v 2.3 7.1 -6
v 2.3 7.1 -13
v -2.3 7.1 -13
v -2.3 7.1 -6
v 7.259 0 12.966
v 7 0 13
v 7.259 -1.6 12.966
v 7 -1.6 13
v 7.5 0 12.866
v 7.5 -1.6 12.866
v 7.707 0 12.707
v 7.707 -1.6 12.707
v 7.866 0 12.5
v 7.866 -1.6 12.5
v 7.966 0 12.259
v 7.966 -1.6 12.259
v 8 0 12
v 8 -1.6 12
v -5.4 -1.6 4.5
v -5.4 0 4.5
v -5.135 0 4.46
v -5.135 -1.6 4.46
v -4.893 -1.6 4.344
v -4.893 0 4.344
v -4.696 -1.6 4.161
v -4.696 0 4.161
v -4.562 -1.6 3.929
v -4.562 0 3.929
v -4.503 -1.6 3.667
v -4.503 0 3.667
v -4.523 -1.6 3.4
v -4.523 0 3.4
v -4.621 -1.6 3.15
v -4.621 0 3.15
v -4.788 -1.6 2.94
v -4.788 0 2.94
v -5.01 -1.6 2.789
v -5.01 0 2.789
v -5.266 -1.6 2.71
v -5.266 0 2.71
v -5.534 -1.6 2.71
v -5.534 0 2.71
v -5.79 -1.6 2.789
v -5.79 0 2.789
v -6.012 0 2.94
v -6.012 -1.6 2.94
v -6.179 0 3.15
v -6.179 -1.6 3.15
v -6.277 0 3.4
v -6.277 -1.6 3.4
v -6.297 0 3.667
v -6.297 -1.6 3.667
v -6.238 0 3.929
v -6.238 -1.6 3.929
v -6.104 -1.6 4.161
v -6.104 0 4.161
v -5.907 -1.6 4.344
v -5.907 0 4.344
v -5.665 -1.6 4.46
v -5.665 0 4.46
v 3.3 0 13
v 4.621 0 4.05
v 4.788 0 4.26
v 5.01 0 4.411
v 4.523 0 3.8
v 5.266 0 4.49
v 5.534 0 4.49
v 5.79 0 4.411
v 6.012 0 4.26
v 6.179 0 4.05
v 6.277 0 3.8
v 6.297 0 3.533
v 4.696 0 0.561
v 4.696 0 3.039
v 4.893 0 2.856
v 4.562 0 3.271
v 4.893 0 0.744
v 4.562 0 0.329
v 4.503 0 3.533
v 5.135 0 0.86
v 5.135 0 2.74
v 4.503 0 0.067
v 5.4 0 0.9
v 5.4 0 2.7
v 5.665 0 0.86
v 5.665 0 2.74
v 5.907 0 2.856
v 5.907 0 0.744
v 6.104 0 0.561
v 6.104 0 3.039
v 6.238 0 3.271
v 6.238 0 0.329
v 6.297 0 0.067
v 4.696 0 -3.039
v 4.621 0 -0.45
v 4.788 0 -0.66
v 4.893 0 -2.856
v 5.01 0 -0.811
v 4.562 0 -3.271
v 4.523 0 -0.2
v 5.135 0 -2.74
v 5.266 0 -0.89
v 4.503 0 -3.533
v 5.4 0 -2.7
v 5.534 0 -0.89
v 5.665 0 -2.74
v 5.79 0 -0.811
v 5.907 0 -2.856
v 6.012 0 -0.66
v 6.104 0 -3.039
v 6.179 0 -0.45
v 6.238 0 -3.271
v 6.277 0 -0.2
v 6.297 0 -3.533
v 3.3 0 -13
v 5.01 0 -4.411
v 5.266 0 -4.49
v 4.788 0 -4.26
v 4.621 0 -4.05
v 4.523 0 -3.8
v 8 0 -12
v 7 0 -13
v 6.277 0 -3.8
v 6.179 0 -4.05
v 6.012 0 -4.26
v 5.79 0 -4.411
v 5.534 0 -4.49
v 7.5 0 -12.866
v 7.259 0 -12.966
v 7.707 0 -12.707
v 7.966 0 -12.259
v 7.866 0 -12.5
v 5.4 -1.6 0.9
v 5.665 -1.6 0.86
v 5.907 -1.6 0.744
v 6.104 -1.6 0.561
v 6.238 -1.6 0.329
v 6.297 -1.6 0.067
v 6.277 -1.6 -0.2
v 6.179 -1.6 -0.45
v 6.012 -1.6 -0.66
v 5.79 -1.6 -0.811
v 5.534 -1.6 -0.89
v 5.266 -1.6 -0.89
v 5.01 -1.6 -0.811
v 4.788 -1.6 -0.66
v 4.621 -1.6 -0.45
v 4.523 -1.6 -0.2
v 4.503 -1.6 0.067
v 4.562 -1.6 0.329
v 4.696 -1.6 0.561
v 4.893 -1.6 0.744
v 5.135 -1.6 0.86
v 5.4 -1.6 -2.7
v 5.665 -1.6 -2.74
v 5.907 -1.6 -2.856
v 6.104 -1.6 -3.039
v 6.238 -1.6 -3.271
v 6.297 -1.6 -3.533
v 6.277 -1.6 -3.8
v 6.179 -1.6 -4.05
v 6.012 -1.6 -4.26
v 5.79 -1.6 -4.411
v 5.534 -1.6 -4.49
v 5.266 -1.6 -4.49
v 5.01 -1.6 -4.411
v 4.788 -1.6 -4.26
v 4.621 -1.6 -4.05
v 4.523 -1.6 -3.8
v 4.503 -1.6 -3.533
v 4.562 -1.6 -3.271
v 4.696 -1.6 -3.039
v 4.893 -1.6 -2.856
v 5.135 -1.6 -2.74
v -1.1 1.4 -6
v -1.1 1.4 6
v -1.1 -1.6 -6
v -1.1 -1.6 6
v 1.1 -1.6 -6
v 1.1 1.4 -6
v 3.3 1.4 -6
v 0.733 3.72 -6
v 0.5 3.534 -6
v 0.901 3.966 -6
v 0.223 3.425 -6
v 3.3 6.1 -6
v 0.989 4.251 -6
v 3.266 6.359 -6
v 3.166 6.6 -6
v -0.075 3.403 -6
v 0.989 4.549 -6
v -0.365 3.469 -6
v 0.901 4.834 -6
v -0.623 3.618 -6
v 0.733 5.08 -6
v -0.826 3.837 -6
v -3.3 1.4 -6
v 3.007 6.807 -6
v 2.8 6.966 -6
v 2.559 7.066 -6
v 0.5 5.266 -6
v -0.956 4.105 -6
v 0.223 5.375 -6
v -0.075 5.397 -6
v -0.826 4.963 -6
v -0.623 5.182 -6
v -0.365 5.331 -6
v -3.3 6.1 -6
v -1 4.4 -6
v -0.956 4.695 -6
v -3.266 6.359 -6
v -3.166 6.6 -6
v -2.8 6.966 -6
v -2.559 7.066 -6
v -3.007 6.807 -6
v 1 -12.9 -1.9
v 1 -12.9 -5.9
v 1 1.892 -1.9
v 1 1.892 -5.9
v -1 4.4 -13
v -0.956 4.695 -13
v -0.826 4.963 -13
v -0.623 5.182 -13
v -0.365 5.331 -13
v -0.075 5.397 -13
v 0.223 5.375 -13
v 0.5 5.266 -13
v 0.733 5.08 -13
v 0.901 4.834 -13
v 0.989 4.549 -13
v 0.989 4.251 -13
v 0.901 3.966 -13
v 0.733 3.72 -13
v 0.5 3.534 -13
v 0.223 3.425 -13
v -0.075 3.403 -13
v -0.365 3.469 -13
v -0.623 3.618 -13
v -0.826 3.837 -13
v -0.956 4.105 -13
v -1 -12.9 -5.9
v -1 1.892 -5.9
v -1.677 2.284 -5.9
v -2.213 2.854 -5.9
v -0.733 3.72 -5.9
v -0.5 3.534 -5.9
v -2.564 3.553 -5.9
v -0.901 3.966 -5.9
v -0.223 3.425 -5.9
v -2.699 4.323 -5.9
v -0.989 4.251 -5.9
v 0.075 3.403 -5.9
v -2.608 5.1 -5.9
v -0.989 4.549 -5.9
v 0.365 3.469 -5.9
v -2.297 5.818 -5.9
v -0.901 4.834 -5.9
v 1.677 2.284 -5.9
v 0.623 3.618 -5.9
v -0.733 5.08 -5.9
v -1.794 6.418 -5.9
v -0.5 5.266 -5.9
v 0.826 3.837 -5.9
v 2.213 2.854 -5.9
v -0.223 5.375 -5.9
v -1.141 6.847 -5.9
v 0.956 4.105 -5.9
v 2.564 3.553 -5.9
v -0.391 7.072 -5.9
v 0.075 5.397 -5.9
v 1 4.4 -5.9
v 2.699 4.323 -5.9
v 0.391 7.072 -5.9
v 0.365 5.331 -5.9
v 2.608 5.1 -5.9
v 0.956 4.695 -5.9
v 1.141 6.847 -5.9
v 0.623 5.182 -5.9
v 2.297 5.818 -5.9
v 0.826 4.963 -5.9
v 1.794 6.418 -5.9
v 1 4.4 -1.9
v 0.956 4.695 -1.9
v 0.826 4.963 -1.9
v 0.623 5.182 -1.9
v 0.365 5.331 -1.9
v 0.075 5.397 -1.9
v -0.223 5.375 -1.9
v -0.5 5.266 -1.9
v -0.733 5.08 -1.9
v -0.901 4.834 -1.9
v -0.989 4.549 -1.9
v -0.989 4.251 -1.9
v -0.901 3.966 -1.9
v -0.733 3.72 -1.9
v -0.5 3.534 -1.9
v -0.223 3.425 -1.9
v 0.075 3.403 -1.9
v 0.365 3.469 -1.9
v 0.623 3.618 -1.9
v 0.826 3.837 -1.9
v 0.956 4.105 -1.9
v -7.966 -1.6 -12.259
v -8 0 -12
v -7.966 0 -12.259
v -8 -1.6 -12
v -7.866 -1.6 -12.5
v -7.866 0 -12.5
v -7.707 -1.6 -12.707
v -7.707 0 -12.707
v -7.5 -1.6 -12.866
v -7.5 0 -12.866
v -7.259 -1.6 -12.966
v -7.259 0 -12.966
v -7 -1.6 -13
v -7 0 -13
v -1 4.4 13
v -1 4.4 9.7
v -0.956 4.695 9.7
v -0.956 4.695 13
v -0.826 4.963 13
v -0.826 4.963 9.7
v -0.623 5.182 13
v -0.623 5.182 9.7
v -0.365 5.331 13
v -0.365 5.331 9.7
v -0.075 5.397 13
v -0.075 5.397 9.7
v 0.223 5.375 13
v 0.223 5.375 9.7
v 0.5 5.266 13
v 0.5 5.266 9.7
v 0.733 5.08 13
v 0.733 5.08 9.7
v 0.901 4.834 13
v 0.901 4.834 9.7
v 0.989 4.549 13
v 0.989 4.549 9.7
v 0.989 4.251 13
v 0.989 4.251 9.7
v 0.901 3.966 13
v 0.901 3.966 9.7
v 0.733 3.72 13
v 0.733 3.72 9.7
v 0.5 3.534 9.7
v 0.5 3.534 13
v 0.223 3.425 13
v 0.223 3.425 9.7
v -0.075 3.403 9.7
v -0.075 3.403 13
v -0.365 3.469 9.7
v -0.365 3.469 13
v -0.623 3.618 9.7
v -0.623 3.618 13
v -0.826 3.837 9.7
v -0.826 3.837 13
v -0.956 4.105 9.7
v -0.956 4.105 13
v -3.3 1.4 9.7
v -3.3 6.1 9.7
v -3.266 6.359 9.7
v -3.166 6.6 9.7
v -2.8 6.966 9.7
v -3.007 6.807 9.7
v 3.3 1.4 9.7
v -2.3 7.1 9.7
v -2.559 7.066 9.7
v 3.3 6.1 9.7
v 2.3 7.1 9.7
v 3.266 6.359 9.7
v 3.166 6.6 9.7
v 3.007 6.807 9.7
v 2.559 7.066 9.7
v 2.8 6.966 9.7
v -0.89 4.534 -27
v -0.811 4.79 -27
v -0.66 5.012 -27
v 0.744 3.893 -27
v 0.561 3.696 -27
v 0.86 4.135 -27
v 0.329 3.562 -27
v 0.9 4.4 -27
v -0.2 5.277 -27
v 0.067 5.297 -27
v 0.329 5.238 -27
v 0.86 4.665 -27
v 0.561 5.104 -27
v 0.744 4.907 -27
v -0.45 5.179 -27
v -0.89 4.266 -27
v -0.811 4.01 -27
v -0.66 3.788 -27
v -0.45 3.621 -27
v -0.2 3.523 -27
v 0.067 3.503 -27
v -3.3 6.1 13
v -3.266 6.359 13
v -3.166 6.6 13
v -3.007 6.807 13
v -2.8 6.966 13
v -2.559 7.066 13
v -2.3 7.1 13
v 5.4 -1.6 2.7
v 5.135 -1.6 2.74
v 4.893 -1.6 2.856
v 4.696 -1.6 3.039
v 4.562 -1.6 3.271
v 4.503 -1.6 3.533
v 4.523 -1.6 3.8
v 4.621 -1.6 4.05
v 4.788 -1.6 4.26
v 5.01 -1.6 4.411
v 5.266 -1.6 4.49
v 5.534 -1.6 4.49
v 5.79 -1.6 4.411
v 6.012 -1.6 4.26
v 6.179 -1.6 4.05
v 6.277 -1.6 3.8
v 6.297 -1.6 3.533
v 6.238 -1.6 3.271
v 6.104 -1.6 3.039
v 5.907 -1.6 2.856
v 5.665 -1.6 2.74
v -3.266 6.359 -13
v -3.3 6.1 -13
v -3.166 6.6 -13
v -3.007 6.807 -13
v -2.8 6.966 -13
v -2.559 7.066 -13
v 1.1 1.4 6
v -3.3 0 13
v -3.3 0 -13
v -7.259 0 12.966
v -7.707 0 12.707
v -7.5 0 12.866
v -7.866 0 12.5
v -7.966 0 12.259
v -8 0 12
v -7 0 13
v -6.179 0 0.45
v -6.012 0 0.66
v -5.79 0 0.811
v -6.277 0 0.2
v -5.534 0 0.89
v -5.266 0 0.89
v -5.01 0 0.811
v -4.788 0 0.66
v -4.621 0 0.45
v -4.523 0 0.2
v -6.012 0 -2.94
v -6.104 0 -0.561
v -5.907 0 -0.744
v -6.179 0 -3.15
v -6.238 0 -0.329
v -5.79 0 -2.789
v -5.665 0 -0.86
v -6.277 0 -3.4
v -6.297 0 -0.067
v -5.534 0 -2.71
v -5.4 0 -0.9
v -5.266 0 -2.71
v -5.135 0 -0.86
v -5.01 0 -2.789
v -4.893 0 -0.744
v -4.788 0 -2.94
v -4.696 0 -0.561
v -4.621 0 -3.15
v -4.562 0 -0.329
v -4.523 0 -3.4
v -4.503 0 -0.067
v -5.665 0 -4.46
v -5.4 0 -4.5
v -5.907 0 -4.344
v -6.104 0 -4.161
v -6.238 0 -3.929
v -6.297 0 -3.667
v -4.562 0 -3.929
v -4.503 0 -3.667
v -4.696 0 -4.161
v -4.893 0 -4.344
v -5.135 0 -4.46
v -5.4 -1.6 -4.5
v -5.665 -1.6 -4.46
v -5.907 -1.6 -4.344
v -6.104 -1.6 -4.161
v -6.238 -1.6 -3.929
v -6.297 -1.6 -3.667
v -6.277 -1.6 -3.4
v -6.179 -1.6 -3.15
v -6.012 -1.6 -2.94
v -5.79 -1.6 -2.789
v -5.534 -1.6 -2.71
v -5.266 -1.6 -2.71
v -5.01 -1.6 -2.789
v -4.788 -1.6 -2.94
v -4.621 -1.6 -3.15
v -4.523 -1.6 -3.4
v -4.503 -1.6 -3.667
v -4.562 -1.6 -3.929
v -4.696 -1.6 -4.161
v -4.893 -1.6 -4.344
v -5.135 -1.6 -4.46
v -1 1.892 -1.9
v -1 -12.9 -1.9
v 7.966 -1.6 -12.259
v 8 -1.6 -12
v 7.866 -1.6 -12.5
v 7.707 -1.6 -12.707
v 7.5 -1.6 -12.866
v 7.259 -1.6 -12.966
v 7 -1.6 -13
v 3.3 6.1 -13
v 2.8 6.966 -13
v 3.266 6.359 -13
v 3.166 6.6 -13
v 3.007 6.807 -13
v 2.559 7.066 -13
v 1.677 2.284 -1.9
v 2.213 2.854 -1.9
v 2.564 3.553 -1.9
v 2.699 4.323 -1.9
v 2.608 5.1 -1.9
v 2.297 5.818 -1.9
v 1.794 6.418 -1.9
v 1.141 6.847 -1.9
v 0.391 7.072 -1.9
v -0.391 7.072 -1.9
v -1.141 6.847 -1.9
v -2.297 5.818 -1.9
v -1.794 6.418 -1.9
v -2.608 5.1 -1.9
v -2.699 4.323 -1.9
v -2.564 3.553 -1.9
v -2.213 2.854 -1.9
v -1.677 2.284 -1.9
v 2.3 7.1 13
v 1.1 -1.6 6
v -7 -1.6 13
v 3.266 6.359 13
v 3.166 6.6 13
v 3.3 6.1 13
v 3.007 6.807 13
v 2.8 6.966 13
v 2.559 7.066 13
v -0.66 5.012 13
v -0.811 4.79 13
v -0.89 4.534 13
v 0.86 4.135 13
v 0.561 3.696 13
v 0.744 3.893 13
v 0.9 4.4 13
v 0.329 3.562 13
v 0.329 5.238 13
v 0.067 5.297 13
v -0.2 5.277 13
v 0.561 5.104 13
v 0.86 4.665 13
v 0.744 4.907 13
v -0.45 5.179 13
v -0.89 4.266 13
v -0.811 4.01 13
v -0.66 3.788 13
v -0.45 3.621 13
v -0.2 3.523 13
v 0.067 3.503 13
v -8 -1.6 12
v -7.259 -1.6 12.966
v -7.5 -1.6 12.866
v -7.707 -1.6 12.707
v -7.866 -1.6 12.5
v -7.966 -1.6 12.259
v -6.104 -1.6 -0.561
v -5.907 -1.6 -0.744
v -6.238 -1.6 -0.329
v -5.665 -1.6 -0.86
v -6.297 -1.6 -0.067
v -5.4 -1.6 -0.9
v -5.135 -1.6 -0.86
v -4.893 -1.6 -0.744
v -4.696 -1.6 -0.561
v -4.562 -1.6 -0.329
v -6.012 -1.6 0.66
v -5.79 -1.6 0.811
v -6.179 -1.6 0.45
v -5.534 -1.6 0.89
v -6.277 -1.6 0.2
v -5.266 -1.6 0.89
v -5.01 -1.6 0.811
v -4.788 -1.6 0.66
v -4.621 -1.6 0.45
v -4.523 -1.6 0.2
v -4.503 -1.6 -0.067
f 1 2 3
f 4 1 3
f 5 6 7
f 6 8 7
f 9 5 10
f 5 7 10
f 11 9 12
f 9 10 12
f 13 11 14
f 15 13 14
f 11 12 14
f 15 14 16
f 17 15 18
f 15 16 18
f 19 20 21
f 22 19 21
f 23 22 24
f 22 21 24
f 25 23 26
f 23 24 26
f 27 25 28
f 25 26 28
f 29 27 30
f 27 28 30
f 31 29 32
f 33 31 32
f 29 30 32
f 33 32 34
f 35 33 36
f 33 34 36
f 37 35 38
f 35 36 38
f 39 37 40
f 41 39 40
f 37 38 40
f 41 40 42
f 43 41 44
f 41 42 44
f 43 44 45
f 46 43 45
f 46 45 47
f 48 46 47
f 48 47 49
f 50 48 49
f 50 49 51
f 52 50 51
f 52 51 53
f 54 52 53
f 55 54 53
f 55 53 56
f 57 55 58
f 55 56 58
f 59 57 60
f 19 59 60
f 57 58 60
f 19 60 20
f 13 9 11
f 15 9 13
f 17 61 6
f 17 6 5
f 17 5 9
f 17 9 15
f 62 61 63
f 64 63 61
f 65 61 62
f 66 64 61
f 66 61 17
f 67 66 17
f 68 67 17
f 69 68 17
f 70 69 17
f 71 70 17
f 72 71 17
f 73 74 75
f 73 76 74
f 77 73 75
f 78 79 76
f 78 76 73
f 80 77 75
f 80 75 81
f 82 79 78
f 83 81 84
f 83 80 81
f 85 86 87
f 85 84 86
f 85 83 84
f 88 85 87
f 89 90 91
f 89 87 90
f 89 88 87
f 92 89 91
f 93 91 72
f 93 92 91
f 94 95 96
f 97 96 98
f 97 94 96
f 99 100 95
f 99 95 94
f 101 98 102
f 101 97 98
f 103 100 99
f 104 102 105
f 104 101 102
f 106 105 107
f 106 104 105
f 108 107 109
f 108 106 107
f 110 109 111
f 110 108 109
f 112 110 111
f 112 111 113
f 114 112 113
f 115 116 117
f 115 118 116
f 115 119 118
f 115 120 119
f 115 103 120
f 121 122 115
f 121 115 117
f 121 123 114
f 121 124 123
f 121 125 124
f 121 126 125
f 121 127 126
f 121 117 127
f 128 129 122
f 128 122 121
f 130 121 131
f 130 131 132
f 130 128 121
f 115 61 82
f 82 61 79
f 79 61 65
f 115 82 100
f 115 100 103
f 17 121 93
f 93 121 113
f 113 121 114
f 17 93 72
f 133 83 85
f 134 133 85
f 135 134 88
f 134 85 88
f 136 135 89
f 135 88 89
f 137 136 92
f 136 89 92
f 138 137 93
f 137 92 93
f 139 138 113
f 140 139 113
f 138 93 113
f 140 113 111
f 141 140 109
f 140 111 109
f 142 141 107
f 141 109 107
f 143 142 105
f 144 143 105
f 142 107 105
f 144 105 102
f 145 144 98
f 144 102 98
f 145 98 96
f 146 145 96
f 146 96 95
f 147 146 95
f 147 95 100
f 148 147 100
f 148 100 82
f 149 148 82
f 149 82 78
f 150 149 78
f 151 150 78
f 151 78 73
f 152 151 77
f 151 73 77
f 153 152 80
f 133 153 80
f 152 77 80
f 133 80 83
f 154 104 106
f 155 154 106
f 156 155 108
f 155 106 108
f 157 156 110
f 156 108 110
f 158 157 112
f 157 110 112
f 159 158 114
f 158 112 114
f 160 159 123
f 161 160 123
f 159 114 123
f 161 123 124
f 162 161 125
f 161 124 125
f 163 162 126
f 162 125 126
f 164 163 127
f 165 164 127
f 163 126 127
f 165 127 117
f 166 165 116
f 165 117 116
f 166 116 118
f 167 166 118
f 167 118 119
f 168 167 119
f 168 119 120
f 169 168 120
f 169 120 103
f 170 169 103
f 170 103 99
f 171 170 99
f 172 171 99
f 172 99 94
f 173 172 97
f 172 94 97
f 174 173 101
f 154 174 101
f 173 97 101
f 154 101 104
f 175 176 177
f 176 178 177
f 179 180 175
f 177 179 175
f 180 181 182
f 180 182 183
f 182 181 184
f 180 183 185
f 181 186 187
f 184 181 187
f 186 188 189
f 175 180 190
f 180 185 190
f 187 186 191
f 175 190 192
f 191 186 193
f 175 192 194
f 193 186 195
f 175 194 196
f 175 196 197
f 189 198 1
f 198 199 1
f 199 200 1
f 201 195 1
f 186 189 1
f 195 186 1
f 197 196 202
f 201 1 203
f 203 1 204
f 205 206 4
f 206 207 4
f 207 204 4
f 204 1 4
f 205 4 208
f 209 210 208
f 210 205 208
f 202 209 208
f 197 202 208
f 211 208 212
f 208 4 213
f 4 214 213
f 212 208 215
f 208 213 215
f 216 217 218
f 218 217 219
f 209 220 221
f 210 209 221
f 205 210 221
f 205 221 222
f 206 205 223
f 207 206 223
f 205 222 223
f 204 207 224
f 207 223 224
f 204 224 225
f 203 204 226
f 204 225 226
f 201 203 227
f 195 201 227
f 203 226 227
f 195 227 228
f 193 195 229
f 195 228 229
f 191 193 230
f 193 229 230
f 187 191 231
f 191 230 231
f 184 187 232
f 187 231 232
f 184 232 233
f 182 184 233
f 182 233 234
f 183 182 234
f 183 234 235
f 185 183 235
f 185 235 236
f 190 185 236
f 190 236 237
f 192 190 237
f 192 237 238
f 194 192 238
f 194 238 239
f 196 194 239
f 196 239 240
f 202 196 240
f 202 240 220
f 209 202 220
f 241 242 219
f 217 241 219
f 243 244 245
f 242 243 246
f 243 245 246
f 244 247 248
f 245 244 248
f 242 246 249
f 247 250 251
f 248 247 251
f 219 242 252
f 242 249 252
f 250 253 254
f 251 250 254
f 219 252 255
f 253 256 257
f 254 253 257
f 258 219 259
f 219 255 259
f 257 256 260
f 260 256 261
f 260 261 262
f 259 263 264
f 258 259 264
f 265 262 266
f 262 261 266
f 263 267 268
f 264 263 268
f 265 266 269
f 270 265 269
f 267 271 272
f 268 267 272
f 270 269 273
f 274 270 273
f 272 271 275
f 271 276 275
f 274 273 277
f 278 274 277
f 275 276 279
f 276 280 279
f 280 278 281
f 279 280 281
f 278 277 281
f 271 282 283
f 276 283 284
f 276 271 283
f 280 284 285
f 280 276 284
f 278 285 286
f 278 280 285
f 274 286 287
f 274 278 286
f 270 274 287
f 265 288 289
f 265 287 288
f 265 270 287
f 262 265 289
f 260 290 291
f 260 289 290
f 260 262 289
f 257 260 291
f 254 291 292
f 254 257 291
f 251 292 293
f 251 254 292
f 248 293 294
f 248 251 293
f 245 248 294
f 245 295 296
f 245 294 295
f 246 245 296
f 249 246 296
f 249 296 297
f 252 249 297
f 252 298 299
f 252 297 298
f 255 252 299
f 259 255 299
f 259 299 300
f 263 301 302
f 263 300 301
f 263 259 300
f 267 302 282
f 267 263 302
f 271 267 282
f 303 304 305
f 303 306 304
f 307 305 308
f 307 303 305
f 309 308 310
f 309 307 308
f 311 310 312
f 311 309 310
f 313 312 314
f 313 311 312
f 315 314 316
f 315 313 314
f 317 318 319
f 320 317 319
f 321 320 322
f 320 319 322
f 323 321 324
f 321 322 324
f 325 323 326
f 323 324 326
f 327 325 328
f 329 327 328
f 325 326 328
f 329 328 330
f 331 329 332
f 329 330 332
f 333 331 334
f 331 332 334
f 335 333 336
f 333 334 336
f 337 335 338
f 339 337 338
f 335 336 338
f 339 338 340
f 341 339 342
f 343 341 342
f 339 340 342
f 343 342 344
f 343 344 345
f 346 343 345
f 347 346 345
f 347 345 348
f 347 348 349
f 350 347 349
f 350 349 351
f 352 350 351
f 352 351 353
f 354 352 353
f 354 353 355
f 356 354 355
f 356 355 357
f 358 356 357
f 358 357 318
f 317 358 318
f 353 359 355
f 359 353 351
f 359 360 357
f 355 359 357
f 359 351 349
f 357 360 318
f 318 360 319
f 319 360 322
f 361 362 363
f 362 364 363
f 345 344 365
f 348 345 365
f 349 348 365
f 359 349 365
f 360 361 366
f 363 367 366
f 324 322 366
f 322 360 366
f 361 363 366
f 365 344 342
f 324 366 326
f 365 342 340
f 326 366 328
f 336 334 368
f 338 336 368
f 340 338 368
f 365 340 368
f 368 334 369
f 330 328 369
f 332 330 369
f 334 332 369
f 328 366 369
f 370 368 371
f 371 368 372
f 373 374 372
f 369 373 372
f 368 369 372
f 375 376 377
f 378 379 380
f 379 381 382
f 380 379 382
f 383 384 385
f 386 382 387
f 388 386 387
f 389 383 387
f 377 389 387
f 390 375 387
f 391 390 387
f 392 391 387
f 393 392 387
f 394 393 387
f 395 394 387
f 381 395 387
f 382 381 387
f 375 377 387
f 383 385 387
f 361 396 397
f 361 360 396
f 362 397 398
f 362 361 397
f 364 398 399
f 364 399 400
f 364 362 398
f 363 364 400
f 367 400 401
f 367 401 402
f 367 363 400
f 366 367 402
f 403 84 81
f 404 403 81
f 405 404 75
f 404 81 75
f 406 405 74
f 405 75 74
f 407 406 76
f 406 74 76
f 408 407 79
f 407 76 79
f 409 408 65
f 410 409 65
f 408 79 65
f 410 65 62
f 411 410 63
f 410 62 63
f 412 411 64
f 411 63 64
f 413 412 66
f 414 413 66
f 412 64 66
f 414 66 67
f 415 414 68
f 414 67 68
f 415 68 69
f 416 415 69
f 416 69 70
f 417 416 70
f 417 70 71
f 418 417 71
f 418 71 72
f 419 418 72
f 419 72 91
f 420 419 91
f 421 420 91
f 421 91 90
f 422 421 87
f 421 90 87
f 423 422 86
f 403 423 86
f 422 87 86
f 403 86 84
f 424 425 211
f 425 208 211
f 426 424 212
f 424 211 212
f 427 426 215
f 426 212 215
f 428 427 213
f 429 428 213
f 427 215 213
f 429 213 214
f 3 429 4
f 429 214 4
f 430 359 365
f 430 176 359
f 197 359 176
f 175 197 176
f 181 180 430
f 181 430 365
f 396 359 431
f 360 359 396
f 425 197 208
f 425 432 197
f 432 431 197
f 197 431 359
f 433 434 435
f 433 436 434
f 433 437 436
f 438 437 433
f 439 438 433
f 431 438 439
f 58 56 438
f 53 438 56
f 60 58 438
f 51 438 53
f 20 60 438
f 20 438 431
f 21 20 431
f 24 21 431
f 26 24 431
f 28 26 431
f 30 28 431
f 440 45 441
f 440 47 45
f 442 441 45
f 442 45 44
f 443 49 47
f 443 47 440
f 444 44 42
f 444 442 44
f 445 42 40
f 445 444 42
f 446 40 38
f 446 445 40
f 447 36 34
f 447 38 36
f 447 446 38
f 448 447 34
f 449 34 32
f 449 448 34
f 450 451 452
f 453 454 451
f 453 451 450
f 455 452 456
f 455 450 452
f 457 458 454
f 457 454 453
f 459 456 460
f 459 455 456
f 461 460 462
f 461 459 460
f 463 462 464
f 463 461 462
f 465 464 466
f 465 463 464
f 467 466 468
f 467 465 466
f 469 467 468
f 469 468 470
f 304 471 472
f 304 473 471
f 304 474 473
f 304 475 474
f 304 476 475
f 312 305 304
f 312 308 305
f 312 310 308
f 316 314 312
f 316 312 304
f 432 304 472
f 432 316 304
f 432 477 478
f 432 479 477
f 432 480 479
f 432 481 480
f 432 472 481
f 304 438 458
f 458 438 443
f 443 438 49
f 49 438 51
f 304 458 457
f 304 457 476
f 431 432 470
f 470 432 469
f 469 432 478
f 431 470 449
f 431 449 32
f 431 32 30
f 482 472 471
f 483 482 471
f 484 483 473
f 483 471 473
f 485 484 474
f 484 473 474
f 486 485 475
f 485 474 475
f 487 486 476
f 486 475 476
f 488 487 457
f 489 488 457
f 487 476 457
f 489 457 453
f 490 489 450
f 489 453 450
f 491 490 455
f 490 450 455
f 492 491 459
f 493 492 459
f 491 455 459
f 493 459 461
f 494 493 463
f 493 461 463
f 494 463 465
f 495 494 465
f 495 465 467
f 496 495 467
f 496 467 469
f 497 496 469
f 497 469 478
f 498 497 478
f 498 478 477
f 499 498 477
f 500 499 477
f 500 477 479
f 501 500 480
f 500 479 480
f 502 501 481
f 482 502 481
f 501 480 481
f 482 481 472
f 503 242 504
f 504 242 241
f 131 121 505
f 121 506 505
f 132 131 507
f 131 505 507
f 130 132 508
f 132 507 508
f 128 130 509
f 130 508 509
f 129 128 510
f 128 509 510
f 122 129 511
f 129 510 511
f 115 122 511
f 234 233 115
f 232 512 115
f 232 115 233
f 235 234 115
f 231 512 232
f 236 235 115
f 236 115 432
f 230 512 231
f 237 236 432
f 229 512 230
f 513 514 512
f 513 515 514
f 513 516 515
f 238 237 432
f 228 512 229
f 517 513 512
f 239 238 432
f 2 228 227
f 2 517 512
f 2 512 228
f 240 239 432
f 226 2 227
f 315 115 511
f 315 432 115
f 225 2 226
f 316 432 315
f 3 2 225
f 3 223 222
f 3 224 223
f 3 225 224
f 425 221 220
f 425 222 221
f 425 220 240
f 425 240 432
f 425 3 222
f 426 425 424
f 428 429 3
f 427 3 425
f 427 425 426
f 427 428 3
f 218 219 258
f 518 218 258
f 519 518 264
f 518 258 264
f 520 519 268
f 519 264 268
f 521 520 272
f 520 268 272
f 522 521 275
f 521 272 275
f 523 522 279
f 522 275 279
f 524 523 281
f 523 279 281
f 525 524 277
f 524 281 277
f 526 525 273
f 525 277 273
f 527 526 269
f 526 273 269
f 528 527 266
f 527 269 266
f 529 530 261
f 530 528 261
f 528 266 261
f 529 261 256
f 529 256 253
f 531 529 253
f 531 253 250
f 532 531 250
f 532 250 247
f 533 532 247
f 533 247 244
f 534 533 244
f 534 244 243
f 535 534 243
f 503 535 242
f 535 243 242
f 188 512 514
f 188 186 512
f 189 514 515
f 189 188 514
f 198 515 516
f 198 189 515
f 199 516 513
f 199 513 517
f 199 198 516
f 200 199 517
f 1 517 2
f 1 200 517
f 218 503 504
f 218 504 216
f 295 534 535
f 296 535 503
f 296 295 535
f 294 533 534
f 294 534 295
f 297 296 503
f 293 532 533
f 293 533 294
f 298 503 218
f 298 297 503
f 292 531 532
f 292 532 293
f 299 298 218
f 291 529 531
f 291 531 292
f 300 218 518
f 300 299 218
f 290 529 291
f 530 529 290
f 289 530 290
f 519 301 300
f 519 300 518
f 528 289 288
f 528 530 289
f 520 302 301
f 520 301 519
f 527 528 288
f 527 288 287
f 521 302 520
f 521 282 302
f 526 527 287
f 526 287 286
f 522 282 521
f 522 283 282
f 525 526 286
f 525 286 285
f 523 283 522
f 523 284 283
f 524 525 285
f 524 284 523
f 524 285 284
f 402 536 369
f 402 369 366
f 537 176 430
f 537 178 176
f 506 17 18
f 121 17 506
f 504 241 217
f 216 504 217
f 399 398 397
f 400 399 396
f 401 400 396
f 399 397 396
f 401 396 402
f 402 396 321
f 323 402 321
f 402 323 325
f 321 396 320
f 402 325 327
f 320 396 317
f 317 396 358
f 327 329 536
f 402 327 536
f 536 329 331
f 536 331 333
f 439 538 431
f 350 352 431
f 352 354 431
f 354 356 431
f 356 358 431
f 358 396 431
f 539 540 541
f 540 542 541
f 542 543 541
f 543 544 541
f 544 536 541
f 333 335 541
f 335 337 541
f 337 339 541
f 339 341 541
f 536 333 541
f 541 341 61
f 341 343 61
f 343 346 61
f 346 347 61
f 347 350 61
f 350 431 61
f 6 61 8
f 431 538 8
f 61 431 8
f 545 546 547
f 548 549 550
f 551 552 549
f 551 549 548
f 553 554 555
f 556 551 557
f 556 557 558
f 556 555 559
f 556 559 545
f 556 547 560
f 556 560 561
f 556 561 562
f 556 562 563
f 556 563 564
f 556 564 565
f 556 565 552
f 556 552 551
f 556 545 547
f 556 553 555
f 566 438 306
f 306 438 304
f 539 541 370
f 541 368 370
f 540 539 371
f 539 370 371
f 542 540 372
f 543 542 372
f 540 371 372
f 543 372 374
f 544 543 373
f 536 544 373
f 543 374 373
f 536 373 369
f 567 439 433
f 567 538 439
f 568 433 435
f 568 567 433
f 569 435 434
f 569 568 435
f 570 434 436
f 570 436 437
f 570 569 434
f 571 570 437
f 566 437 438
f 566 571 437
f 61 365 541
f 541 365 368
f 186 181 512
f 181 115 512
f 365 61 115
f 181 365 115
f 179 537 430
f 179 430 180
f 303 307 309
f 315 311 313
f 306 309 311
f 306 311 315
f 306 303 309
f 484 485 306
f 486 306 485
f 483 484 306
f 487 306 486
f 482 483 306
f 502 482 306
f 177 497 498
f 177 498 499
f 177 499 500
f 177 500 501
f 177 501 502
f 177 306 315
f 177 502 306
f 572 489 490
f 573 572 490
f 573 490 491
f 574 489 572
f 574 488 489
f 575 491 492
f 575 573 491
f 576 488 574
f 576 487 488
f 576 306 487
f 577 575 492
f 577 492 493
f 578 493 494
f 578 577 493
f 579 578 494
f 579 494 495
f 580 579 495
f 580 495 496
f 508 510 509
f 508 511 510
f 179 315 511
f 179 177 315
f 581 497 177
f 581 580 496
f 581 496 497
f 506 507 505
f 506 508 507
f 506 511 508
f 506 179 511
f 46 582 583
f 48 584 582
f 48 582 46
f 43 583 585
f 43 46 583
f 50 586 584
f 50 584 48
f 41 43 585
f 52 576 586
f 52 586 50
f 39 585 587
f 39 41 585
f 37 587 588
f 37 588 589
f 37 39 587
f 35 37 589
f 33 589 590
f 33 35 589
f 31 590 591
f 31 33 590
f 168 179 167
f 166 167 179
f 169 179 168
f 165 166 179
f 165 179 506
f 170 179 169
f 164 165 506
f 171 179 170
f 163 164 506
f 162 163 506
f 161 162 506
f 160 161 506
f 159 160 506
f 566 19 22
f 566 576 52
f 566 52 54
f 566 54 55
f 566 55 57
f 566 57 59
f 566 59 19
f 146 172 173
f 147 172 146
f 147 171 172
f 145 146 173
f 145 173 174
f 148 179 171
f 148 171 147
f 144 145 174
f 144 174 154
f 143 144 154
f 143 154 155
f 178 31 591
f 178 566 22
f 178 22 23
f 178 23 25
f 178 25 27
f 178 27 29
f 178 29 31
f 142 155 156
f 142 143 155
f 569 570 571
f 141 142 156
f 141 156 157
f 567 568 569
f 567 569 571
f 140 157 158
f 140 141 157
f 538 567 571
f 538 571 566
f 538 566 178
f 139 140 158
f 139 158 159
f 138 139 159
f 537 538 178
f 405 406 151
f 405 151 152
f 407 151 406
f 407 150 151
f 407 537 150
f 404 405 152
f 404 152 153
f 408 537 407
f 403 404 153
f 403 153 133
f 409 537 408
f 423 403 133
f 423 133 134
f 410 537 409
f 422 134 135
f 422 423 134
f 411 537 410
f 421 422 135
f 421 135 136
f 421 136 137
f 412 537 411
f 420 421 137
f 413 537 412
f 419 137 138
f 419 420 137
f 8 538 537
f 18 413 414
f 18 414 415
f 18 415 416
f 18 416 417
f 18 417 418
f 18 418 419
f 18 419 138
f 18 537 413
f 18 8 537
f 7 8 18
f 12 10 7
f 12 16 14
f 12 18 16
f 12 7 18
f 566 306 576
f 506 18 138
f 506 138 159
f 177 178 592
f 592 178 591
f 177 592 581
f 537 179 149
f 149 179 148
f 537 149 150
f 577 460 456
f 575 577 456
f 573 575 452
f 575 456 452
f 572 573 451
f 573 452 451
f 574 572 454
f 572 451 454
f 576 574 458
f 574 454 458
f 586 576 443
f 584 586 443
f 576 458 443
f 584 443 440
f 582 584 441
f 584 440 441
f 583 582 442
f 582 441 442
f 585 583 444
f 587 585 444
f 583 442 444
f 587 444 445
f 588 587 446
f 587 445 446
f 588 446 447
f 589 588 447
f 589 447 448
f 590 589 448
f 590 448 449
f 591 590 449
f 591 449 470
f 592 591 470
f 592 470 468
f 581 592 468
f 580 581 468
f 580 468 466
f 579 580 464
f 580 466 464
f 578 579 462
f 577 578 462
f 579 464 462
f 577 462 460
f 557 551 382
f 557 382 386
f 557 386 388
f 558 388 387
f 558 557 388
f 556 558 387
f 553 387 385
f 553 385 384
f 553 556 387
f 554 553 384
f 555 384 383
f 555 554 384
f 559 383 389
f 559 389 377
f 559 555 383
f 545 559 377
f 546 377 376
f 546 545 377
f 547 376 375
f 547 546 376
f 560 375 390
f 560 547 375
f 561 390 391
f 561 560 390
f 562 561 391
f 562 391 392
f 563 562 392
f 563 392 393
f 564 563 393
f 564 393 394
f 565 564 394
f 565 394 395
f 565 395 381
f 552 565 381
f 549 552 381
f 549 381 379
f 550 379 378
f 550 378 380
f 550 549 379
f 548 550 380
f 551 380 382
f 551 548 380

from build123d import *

# Parameters (mm, degrees)
IZIM1_W                     = 16
IZIM1_H                     = 26
IZIM1_R                     = 0.9
IZIM1_W_2                   = 2.2
IZIM1_H_2                   = 12
Y_KSEKLIK_EKSTR_ZYON1_DEPTH = 1.6
IZIM2_W                     = 6.6
IZIM2_H                     = 26
IZIM2_W_2                   = 2.2
IZIM2_H_2                   = 12
Y_KSEKLIK_EKSTR_ZYON2_DEPTH = 1.4
IZIM3_W                     = 6.6
IZIM3_H                     = 5.7
Y_KSEKLIK_EKSTR_ZYON3_DEPTH = 7
Y_KSEKLIK_EKSTR_ZYON4_DEPTH = 3.3
IZIM5_R                     = 1
KES_EKSTR_ZYON1_DEPTH       = 29.114231272
RADYUS1_R                   = 1
Y_KSEKLIK_EKSTR_ZYON5_START = 0.1
IZIM6_R                     = 2.7
IZIM6_R_2                   = 1
Y_KSEKLIK_EKSTR_ZYON5_DEPTH = 4
Y_KSEKLIK_EKSTR_ZYON6_START = -4
Y_KSEKLIK_EKSTR_ZYON6_DEPTH = 4
IZIM8_R                     = 0.9
Y_KSEKLIK_EKSTR_ZYON7_DEPTH = 40
RADYUS2_R                   = 1


with BuildPart() as part:
    # Çizim1 → Yükseklik-Ekstrüzyon1 (new body)
    with BuildSketch(Plane(origin=(0, 0, 0), x_dir=(1, 0, 0), z_dir=(0, 1, 0))):
        Rectangle(IZIM1_W, IZIM1_H)
        with Locations(Location((5.4, 0, 0), (0, 0, 270))):
            Circle(IZIM1_R, mode=Mode.SUBTRACT)
        with Locations(Location((5.4, 3.6, 0), (0, 0, 270))):
            Circle(IZIM1_R, mode=Mode.SUBTRACT)
        with Locations(Location((5.4, -3.6, 0), (0, 0, 90))):
            Circle(IZIM1_R, mode=Mode.SUBTRACT)
        with Locations(Location((-5.4, 3.6, 0), (0, 0, 90))):
            Circle(IZIM1_R, mode=Mode.SUBTRACT)
        with Locations(Location((-5.4, -3.6, 0), (0, 0, 270))):
            Circle(IZIM1_R, mode=Mode.SUBTRACT)
        with Locations(Location((-5.4, 0, 0), (0, 0, 90))):
            Circle(IZIM1_R, mode=Mode.SUBTRACT)
        Rectangle(IZIM1_W_2, IZIM1_H_2, mode=Mode.SUBTRACT)
    extrude(amount=-Y_KSEKLIK_EKSTR_ZYON1_DEPTH)

    # Çizim2 → Yükseklik-Ekstrüzyon2 (add)
    with BuildSketch(Plane(origin=(0, 0, 0), x_dir=(1, 0, 0), z_dir=(0, 1, 0))):
        Rectangle(IZIM2_W, IZIM2_H)
        Rectangle(IZIM2_W_2, IZIM2_H_2, mode=Mode.SUBTRACT)
    extrude(amount=Y_KSEKLIK_EKSTR_ZYON2_DEPTH)

    # Çizim3 → Yükseklik-Ekstrüzyon3 (add)
    with BuildSketch(Plane(origin=(0, 0, -13), x_dir=(-1, 0, 0), z_dir=(0, 0, -1))):
        with Locations((0, 4.25)):
            Rectangle(IZIM3_W, IZIM3_H)
    extrude(amount=-Y_KSEKLIK_EKSTR_ZYON3_DEPTH)

    # Çizim4 → Yükseklik-Ekstrüzyon4 (add)
    with BuildSketch(Plane.XY.offset(13)):
        Polygon((1.1, -1.6), (1.1, 1.4), (3.3, 1.4), (3.3, 7.1), (-3.3, 7.1), (-3.3, 1.4), (-1.1, 1.4), (-1.1, -1.6), align=None)
    extrude(amount=-Y_KSEKLIK_EKSTR_ZYON4_DEPTH)

    # Çizim5 → Kes-Ekstrüzyon1 (cut, through all)
    with BuildSketch(Plane(origin=(0, 0, -13), x_dir=(-1, 0, 0), z_dir=(0, 0, -1))):
        with Locations((0, 4.4)):
            Circle(IZIM5_R)
    extrude(amount=-KES_EKSTR_ZYON1_DEPTH, mode=Mode.SUBTRACT)

    # Radyus1
    radyus1_edges = [part.edges().sort_by_distance(p)[0] for p in [
        (-3.3, 7.1, 11.35),
        (3.3, 7.1, 11.35),
        (3.3, 7.1, -9.5),
        (-3.3, 7.1, -9.5),
    ]]
    fillet(radyus1_edges, radius=RADYUS1_R)

    # Radyus2
    radyus2_edges = [part.edges().sort_by_distance(p)[0] for p in [
        (8, -0.8, 13),
        (-8, -0.8, 13),
        (-8, -0.8, -13),
        (8, -0.8, -13),
    ]]
    fillet(radyus2_edges, radius=RADYUS2_R)


with BuildPart() as body_2:
    # Çizim6 → Yükseklik-Ekstrüzyon5 (new body)
    with BuildSketch(Plane.XY.offset(-6).offset(Y_KSEKLIK_EKSTR_ZYON5_START)):
        with Locations((0, 4.4)):
            Circle(IZIM6_R)
        with Locations((0, 4.4)):
            Circle(IZIM6_R_2, mode=Mode.SUBTRACT)
    extrude(amount=Y_KSEKLIK_EKSTR_ZYON5_DEPTH)

    # Çizim7 → Yükseklik-Ekstrüzyon6 (add)
    with BuildSketch(Plane.XY.offset(-1.9).offset(Y_KSEKLIK_EKSTR_ZYON6_START)):
        with BuildLine():
            ThreePointArc((1, 4.4), (0, 3.4), (-1, 4.4))
            Line((-1, 4.4), (-1, 1.892012759))
            ThreePointArc((-1, 1.892012759), (0, 1.7), (1, 1.892012759))
            Line((1, 1.892012759), (1, 4.4))
        make_face()
        with BuildLine():
            Line((-1, 1.892012759), (-1, 4.4))
            ThreePointArc((-1, 4.4), (0, 5.4), (1, 4.4))
            Line((1, 4.4), (1, 1.892012759))
            ThreePointArc((1, 1.892012759), (2.234949664, 2.885074259), (2.7, 4.4))
            ThreePointArc((2.7, 4.4), (-1.514925741, 6.634949664), (-1, 1.892012759))
        make_face()
        with BuildLine():
            ThreePointArc((1, 1.892012759), (0, 1.7), (-1, 1.892012759))
            Line((-1, 1.892012759), (-1, -12.9))
            Line((-1, -12.9), (1, -12.9))
            Line((1, -12.9), (1, 1.892012759))
        make_face()
    extrude(amount=Y_KSEKLIK_EKSTR_ZYON6_DEPTH)


with BuildPart() as body_3:
    # Çizim8 → Yükseklik-Ekstrüzyon7 (new body)
    with BuildSketch(Plane.XY.offset(13)):
        with Locations((0, 4.4)):
            Circle(IZIM8_R)
    extrude(amount=-Y_KSEKLIK_EKSTR_ZYON7_DEPTH)


solid = Compound([part.part, body_2.part, body_3.part])
